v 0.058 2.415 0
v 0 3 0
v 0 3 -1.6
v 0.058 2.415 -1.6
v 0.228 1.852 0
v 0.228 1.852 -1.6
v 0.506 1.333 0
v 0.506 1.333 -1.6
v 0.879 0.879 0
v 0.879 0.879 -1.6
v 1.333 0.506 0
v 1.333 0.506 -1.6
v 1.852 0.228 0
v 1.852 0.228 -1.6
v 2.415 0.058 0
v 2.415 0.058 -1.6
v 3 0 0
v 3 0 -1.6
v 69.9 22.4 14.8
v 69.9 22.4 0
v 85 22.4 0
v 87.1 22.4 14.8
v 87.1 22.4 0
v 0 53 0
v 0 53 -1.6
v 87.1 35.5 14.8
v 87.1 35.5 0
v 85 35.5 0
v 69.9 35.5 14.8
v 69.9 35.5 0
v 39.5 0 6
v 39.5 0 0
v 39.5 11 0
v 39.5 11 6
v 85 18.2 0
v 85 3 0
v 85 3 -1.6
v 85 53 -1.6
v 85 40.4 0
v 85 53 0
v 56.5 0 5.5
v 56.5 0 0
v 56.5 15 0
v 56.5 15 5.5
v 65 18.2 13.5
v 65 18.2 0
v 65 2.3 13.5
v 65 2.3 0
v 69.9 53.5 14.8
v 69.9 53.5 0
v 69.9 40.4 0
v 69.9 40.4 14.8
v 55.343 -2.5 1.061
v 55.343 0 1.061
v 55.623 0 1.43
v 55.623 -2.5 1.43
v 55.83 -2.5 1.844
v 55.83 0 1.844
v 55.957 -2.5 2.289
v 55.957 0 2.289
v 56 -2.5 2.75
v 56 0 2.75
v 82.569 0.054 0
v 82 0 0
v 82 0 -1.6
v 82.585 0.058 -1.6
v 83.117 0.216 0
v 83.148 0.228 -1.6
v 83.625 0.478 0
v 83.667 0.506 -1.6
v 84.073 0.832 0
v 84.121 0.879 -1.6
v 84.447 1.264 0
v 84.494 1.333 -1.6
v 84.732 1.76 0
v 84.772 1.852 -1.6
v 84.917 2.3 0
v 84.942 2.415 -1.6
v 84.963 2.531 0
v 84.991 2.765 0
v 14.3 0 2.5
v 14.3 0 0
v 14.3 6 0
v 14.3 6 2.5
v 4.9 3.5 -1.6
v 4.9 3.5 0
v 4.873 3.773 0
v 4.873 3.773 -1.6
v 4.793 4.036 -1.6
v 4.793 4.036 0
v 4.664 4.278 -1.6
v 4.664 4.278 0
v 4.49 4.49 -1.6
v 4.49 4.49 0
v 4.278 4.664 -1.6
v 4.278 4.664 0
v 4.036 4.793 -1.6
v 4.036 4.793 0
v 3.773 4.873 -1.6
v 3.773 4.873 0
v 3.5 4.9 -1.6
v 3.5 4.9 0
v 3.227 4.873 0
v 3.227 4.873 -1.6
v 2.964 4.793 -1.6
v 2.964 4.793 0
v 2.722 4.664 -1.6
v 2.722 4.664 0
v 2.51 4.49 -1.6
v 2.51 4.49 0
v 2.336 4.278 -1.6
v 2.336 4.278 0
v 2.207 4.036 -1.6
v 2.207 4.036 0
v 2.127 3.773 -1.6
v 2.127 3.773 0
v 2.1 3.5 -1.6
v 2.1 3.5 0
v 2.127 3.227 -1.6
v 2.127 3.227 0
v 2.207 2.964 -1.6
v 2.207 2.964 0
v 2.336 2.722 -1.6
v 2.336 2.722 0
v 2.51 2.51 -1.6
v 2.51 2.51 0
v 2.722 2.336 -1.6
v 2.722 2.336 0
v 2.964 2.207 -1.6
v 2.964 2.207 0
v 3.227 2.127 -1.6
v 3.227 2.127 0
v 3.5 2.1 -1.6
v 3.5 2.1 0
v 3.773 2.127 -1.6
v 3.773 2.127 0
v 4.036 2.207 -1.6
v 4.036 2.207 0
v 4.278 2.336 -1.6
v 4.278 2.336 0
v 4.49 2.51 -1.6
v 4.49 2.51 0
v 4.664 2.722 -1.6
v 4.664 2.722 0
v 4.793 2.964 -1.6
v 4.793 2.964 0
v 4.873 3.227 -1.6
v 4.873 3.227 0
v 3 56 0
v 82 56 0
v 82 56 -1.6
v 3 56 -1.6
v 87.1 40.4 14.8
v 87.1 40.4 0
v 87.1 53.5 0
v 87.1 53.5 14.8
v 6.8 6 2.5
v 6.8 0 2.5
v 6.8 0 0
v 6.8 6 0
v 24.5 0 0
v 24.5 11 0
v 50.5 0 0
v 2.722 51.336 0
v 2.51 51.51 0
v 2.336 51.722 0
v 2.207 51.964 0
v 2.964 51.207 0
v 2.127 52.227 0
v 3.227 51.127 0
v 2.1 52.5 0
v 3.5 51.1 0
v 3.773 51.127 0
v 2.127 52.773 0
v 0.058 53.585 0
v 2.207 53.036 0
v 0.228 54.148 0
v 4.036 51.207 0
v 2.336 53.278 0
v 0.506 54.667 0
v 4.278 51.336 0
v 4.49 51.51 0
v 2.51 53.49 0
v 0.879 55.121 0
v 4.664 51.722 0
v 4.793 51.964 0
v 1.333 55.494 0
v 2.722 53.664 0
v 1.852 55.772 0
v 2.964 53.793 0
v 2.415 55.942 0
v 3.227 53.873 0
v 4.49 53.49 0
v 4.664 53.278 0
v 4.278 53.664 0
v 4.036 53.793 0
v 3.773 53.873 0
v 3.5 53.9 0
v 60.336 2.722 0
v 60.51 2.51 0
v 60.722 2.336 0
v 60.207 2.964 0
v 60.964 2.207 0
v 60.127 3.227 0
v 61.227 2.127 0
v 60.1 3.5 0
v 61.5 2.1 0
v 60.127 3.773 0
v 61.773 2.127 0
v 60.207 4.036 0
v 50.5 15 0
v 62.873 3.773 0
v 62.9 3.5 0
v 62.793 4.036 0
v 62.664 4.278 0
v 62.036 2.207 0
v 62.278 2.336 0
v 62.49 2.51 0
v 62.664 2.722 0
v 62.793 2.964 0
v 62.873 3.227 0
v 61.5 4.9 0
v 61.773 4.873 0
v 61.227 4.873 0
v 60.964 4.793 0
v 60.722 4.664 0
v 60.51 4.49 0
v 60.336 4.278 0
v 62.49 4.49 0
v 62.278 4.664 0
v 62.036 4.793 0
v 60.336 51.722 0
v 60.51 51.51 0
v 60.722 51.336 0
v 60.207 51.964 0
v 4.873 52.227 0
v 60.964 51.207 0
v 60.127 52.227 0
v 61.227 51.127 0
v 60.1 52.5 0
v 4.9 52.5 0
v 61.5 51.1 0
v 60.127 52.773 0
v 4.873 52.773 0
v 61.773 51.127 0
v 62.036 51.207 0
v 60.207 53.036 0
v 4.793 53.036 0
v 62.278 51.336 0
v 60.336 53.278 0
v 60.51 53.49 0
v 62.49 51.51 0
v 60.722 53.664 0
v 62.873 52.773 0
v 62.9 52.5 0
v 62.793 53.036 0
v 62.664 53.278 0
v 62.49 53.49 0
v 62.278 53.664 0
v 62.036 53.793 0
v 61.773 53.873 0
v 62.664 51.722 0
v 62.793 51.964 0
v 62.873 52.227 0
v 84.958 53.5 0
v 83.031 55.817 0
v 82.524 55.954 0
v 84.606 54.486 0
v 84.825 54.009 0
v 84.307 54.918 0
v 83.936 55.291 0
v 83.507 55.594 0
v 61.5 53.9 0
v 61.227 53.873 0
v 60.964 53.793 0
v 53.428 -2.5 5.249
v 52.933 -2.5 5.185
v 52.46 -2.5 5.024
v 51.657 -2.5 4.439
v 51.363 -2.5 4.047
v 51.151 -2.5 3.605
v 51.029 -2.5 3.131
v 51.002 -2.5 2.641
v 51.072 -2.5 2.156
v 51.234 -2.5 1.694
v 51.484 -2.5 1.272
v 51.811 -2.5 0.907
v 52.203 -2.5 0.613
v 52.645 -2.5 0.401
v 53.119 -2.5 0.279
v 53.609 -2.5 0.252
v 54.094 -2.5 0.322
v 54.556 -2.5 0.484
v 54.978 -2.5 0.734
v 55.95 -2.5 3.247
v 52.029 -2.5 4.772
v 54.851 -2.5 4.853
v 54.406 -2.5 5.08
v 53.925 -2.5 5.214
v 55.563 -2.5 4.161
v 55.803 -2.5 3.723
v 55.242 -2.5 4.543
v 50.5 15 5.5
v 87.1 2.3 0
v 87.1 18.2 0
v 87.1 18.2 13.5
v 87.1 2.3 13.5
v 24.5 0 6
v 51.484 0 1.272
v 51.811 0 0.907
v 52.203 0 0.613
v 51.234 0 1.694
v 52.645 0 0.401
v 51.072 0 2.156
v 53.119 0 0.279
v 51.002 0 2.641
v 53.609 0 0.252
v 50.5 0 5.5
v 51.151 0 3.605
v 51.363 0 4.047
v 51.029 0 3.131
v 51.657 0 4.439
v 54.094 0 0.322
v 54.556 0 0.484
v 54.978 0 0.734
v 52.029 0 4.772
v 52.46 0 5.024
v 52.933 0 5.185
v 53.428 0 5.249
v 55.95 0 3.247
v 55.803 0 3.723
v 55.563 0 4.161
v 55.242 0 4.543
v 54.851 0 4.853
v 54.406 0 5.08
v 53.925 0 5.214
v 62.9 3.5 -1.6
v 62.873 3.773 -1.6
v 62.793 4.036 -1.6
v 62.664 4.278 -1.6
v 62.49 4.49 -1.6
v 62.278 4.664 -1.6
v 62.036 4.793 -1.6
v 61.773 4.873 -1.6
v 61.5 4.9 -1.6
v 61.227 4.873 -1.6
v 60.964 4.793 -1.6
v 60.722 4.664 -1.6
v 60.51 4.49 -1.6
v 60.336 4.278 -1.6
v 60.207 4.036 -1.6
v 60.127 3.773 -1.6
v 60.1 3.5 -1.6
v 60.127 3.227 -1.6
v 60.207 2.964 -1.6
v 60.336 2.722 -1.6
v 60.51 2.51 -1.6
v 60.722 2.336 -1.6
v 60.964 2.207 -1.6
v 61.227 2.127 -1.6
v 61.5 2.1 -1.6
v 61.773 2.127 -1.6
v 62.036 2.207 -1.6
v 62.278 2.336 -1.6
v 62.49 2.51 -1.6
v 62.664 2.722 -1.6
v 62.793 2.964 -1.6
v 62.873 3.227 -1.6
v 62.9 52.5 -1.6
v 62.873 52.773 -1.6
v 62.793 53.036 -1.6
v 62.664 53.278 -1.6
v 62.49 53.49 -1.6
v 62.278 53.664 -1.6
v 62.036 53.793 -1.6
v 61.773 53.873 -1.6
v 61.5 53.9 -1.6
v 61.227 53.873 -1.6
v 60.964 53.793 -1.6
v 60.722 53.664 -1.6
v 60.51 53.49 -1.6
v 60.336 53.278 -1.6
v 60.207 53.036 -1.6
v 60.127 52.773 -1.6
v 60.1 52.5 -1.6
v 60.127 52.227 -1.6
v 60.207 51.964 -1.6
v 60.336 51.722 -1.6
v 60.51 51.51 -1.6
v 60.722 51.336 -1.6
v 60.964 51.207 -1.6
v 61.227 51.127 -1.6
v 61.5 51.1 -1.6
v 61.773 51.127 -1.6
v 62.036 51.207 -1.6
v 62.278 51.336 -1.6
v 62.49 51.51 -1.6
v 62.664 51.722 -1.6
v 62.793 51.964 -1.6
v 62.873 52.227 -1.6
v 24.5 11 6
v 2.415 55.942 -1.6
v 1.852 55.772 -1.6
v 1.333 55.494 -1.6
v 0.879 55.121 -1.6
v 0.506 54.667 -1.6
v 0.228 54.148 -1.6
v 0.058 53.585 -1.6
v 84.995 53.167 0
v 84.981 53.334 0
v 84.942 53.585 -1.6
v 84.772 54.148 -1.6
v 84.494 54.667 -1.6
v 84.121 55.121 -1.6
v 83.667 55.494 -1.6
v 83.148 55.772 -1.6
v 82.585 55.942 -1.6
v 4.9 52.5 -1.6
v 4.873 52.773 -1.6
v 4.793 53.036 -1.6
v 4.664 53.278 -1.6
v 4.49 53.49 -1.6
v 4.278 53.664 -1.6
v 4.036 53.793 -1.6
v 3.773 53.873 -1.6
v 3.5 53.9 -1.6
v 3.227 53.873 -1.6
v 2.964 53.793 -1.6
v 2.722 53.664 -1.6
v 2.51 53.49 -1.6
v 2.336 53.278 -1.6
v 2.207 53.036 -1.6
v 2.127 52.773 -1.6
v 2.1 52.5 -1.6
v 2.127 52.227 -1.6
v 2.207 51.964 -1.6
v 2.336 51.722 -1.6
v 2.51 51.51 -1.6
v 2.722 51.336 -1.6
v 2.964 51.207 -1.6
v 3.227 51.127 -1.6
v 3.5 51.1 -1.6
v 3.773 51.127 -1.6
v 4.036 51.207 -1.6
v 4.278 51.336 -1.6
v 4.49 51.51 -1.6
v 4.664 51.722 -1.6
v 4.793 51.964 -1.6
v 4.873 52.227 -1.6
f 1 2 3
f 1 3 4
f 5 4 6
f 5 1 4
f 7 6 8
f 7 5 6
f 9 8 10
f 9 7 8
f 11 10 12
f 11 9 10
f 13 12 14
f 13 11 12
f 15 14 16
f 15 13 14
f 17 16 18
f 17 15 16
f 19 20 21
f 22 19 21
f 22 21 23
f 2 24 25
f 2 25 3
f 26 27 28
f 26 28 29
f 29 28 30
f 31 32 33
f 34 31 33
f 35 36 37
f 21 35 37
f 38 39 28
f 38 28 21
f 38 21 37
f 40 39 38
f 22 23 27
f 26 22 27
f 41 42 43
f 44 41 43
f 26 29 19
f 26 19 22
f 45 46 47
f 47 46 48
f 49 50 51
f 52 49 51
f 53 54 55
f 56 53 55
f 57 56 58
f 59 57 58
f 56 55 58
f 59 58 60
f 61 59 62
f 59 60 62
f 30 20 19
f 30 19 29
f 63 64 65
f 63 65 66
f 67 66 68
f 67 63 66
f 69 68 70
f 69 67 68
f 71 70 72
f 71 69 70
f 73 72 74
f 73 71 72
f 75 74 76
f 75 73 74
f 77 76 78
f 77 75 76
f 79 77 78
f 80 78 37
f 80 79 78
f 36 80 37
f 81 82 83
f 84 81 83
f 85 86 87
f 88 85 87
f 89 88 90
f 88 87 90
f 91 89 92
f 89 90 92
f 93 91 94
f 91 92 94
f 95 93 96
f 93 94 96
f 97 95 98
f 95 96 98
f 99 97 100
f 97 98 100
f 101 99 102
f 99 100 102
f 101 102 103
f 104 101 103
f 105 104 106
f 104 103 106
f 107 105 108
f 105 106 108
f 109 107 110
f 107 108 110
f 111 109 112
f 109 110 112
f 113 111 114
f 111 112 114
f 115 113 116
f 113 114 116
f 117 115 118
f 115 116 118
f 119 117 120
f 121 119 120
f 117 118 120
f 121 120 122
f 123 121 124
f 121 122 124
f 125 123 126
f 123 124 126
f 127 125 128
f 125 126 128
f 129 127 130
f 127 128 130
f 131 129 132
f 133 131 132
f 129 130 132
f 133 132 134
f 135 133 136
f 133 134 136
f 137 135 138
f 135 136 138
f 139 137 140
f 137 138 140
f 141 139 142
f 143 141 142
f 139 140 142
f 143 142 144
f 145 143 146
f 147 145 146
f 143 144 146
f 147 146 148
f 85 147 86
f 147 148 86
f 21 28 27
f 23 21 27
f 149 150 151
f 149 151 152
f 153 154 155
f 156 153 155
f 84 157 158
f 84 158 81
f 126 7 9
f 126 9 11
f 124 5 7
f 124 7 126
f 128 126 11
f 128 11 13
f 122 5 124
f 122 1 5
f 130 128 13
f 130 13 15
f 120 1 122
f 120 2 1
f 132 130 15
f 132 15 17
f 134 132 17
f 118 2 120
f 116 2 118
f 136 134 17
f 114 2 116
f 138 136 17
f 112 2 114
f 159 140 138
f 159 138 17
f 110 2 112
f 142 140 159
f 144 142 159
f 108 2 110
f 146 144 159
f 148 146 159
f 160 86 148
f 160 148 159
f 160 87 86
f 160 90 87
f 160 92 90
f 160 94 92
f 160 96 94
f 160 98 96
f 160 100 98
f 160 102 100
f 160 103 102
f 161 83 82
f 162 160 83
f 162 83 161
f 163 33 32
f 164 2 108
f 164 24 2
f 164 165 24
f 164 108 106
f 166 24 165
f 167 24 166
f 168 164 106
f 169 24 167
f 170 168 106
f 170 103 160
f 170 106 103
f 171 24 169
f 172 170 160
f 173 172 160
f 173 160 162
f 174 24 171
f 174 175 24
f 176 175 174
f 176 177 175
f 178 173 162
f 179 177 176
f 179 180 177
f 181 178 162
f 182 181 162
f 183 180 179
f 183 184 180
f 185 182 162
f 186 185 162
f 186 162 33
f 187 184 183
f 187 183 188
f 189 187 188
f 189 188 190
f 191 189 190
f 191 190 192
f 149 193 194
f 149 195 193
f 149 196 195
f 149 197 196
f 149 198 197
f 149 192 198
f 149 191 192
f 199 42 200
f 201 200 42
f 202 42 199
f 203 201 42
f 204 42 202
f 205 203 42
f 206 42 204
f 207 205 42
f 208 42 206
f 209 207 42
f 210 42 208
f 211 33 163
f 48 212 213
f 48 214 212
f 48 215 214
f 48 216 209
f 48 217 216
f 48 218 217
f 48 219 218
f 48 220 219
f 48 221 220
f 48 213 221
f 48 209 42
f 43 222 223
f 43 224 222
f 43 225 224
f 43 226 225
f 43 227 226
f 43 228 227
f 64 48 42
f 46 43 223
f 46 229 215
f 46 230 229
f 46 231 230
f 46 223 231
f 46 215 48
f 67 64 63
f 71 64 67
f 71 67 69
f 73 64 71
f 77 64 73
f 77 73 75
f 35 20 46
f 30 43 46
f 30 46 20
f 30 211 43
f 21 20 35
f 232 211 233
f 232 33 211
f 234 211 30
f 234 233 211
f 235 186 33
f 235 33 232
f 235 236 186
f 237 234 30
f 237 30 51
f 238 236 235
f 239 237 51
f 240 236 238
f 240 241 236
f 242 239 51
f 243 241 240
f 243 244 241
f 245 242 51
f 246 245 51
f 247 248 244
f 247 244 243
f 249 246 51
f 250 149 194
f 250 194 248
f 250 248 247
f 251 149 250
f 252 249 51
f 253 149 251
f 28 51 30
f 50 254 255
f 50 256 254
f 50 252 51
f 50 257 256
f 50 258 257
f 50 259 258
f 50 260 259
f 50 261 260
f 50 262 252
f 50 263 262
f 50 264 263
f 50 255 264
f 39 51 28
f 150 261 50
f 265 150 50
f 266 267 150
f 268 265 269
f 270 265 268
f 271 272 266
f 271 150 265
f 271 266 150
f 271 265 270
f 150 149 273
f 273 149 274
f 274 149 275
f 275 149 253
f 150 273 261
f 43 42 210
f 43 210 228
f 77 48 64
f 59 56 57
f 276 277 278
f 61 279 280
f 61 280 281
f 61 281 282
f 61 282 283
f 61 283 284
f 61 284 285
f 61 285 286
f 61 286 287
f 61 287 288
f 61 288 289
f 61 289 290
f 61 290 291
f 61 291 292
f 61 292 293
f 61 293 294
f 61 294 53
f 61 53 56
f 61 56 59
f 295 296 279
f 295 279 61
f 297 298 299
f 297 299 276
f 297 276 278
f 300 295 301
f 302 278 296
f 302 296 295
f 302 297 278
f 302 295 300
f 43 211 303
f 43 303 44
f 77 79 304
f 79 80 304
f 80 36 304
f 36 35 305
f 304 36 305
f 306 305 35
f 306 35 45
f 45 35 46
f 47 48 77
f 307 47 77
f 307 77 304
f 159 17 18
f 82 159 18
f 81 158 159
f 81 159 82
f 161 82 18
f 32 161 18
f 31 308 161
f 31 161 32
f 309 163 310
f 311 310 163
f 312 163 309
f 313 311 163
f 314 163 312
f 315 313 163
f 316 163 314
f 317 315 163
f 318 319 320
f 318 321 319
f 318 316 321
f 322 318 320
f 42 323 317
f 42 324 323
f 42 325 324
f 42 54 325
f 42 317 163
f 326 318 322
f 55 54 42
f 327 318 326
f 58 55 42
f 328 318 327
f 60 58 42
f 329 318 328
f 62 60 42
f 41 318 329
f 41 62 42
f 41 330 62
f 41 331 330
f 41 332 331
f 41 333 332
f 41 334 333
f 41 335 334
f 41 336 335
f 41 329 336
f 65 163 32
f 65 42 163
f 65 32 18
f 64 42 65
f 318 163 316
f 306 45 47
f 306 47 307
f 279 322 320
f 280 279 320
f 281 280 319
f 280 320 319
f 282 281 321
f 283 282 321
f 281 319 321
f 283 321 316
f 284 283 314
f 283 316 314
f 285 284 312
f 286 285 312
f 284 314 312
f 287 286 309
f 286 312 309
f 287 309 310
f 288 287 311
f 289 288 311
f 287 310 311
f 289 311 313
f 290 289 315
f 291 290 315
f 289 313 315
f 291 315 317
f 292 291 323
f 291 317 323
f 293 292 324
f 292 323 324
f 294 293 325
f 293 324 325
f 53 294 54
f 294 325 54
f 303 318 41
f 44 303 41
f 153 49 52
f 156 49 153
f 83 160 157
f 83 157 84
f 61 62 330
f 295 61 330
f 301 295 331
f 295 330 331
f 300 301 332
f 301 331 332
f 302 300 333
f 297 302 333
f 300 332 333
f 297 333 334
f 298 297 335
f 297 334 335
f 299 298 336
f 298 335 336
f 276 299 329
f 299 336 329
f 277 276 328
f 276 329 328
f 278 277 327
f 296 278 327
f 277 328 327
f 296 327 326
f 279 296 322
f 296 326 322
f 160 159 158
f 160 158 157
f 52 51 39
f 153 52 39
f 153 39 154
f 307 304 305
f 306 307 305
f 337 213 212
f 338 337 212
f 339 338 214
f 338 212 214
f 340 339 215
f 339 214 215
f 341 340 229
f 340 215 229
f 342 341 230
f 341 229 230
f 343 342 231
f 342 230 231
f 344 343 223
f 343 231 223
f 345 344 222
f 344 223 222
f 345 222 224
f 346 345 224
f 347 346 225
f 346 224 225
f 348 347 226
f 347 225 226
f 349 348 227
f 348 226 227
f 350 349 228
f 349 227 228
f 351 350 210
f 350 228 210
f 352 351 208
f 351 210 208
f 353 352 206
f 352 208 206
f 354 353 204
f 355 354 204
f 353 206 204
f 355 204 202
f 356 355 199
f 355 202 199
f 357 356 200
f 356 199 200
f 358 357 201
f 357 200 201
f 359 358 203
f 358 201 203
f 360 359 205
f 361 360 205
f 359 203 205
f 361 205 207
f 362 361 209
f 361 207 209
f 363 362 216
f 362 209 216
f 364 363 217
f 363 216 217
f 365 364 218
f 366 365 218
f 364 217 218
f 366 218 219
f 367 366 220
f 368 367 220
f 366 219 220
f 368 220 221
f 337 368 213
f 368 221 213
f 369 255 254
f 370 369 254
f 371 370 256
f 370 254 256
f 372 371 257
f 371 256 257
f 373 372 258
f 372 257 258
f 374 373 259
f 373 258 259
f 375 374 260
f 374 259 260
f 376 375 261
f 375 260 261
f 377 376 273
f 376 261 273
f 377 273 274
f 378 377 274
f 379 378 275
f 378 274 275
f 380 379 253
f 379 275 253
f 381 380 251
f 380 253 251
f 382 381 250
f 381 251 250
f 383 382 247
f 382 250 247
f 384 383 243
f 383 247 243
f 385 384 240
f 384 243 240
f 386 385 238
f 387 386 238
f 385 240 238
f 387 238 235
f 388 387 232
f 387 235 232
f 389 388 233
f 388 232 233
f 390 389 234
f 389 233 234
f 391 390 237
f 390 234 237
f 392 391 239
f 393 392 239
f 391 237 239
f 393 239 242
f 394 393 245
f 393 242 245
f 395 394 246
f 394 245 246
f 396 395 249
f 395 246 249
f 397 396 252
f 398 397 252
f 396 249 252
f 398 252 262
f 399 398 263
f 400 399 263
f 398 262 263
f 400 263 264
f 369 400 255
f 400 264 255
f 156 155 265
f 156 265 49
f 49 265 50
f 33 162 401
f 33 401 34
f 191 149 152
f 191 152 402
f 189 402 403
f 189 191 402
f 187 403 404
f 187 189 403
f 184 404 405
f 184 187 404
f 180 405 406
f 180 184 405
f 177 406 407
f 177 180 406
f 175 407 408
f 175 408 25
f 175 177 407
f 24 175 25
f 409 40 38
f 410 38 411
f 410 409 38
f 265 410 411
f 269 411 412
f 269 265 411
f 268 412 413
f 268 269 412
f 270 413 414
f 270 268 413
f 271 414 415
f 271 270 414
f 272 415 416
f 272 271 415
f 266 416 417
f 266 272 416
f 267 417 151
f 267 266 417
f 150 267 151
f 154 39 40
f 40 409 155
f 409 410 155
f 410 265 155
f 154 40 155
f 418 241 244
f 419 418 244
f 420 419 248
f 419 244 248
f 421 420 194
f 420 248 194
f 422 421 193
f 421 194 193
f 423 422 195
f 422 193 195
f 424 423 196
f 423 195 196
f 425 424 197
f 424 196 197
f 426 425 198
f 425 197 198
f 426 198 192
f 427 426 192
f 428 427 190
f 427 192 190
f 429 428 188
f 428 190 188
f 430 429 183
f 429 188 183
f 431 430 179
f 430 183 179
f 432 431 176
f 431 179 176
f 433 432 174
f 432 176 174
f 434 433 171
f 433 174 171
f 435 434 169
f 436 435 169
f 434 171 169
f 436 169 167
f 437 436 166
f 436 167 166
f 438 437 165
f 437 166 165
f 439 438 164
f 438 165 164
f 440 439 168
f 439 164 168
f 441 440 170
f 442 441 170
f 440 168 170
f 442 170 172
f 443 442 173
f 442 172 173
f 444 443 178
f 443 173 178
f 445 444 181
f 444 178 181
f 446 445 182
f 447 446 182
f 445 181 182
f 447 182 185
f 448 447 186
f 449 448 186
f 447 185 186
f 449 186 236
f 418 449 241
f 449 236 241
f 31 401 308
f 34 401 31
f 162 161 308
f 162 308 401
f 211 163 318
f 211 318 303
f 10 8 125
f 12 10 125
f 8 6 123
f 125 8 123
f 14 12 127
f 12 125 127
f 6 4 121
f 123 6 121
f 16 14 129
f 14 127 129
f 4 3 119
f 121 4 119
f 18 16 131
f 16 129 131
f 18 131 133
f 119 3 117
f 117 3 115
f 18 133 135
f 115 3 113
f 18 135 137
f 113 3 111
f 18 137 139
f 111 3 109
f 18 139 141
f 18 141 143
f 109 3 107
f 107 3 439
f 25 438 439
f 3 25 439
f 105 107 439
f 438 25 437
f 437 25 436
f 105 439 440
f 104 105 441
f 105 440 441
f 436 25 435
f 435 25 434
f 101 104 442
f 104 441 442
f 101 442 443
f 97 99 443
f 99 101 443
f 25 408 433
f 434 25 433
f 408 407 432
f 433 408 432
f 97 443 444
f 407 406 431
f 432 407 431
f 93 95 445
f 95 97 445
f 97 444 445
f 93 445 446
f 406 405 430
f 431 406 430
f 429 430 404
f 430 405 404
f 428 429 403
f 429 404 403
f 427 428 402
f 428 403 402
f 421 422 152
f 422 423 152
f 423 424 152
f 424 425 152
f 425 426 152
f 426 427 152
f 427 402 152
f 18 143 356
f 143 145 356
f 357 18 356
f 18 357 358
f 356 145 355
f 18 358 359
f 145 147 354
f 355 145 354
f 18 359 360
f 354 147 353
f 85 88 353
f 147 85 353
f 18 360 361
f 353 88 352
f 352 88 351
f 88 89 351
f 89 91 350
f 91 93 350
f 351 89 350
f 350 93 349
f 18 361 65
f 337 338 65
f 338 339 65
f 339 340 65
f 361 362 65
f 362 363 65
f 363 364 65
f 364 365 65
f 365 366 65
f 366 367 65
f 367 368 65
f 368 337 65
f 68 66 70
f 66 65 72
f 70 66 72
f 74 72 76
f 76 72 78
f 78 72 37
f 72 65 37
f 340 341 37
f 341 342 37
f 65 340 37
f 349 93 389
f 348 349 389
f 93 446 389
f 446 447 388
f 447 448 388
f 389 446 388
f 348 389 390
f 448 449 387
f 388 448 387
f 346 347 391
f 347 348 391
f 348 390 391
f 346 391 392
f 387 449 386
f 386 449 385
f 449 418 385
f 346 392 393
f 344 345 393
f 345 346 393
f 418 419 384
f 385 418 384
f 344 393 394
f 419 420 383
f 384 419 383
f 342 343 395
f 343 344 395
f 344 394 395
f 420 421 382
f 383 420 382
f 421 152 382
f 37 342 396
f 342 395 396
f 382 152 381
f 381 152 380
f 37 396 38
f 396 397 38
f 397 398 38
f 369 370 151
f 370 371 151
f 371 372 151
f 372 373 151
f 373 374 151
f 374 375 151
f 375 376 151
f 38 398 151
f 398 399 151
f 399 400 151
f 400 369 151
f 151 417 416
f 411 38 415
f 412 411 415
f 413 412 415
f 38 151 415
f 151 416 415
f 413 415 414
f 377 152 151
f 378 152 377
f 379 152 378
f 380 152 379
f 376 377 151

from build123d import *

# Parameters (mm, degrees)
F0_R      = 1.4
F1_DEPTH  = 1.6
F3_DEPTH  = 13.5
F4_W      = 15.1002969221
F4_H      = 13.1
F4_W_2    = 2.1
F5_DEPTH  = 14.8
F6_W      = 6
F6_H      = 15
F7_DEPTH  = 5.5
F9_DEPTH  = 2.5
F10_W     = 15
F10_H     = 11
F11_DEPTH = 6
F12_W     = 7.5
F12_H     = 6
F13_DEPTH = 2.5


with BuildPart() as f1:
    # F0 (on Top) → F1 (new body)
    with BuildSketch(Plane.XY):
        with BuildLine():
            ThreePointArc((0, 3), (0.8786796564, 0.8786796564), (3, 0))
            Line((3, 0), (82, 0))
            ThreePointArc((82, 0), (84.1213203436, 0.8786796564), (85, 3))
            Line((85, 3), (85, 53))
            ThreePointArc((85, 53), (84.1213203436, 55.1213203436), (82, 56))
            Line((82, 56), (3, 56))
            ThreePointArc((3, 56), (0.8786796564, 55.1213203436), (0, 53))
            Line((0, 53), (0, 3))
        make_face()
        with Locations((3.5, 3.5)):
            Circle(F0_R, mode=Mode.SUBTRACT)
        with Locations((61.5, 3.5)):
            Circle(F0_R, mode=Mode.SUBTRACT)
        with Locations((3.5, 52.5)):
            Circle(F0_R, mode=Mode.SUBTRACT)
        with Locations((61.5, 52.5)):
            Circle(F0_R, mode=Mode.SUBTRACT)
    extrude(amount=-F1_DEPTH)

    # F2 (on face) → F3 (join)
    with BuildSketch(Plane.XY):
        with BuildLine():
            Line((84.9171904292, 2.3), (87.1, 2.3))
            Line((87.1, 2.3), (87.1, 18.2))
            Line((87.1, 18.2), (85, 18.2))
            Line((85, 18.2), (85, 3))
            ThreePointArc((85, 3), (84.9792256786, 2.6475594288), (84.9171904292, 2.3))
        make_face()
        with BuildLine():
            Line((65, 2.3), (84.9171904292, 2.3))
            ThreePointArc((84.9171904292, 2.3), (84.9792256786, 2.6475594288), (85, 3))
            Line((85, 3), (85, 18.2))
            Line((85, 18.2), (65, 18.2))
            Line((65, 18.2), (65, 2.3))
        make_face()
    extrude(amount=F3_DEPTH)

    # F4 (on face) → F5 (join)
    with BuildSketch(Plane.XY):
        with Locations((77.4498515389, 28.95)):
            Rectangle(F4_W, F4_H)
        with BuildLine():
            Line((84.9580398915, 53.5), (69.8997030779, 53.5))
            Line((69.8997030779, 53.5), (69.8997030779, 40.4))
            Line((69.8997030779, 40.4), (85, 40.4))
            Line((85, 40.4), (85, 53))
            ThreePointArc((85, 53), (84.9894915684, 53.2508787808), (84.9580398915, 53.5))
        make_face()
        with BuildLine():
            Line((87.1, 53.5), (84.9580398915, 53.5))
            ThreePointArc((84.9580398915, 53.5), (84.9894915684, 53.2508787808), (85, 53))
            Line((85, 53), (85, 40.4))
            Line((85, 40.4), (87.1, 40.4))
            Line((87.1, 40.4), (87.1, 53.5))
        make_face()
        with Locations((86.05, 28.95)):
            Rectangle(F4_W_2, F4_H)
    extrude(amount=F5_DEPTH)

    # F6 (on face) → F7 (join)
    with BuildSketch(Plane.XY):
        with Locations((53.5, 7.5)):
            Rectangle(F6_W, F6_H)
    extrude(amount=F7_DEPTH)

    # F8 (on face) → F9 (join)
    with BuildSketch(Plane.XZ):
        with BuildLine():
            Line((55.3428853505, 1.0606884287), (51.6571146495, 4.4393115713))
            ThreePointArc((51.6571146495, 4.4393115713), (51.8106884287, 0.9071146495), (55.3428853505, 1.0606884287))
        make_face()
        with BuildLine():
            ThreePointArc((56, 2.75), (54.4063075151, 5.0799370567), (51.6571146495, 4.4393115713))
            Line((51.6571146495, 4.4393115713), (55.3428853505, 1.0606884287))
            ThreePointArc((55.3428853505, 1.0606884287), (55.8299370567, 1.8436924849), (56, 2.75))
        make_face()
    extrude(amount=F9_DEPTH)

    # F10 (on face) → F11 (join)
    with BuildSketch(Plane.XY):
        with Locations((32, 5.5)):
            Rectangle(F10_W, F10_H)
    extrude(amount=F11_DEPTH)

    # F12 (on face) → F13 (join)
    with BuildSketch(Plane.XY):
        with Locations((10.55, 3)):
            Rectangle(F12_W, F12_H)
    extrude(amount=F13_DEPTH)


solid = f1.part
